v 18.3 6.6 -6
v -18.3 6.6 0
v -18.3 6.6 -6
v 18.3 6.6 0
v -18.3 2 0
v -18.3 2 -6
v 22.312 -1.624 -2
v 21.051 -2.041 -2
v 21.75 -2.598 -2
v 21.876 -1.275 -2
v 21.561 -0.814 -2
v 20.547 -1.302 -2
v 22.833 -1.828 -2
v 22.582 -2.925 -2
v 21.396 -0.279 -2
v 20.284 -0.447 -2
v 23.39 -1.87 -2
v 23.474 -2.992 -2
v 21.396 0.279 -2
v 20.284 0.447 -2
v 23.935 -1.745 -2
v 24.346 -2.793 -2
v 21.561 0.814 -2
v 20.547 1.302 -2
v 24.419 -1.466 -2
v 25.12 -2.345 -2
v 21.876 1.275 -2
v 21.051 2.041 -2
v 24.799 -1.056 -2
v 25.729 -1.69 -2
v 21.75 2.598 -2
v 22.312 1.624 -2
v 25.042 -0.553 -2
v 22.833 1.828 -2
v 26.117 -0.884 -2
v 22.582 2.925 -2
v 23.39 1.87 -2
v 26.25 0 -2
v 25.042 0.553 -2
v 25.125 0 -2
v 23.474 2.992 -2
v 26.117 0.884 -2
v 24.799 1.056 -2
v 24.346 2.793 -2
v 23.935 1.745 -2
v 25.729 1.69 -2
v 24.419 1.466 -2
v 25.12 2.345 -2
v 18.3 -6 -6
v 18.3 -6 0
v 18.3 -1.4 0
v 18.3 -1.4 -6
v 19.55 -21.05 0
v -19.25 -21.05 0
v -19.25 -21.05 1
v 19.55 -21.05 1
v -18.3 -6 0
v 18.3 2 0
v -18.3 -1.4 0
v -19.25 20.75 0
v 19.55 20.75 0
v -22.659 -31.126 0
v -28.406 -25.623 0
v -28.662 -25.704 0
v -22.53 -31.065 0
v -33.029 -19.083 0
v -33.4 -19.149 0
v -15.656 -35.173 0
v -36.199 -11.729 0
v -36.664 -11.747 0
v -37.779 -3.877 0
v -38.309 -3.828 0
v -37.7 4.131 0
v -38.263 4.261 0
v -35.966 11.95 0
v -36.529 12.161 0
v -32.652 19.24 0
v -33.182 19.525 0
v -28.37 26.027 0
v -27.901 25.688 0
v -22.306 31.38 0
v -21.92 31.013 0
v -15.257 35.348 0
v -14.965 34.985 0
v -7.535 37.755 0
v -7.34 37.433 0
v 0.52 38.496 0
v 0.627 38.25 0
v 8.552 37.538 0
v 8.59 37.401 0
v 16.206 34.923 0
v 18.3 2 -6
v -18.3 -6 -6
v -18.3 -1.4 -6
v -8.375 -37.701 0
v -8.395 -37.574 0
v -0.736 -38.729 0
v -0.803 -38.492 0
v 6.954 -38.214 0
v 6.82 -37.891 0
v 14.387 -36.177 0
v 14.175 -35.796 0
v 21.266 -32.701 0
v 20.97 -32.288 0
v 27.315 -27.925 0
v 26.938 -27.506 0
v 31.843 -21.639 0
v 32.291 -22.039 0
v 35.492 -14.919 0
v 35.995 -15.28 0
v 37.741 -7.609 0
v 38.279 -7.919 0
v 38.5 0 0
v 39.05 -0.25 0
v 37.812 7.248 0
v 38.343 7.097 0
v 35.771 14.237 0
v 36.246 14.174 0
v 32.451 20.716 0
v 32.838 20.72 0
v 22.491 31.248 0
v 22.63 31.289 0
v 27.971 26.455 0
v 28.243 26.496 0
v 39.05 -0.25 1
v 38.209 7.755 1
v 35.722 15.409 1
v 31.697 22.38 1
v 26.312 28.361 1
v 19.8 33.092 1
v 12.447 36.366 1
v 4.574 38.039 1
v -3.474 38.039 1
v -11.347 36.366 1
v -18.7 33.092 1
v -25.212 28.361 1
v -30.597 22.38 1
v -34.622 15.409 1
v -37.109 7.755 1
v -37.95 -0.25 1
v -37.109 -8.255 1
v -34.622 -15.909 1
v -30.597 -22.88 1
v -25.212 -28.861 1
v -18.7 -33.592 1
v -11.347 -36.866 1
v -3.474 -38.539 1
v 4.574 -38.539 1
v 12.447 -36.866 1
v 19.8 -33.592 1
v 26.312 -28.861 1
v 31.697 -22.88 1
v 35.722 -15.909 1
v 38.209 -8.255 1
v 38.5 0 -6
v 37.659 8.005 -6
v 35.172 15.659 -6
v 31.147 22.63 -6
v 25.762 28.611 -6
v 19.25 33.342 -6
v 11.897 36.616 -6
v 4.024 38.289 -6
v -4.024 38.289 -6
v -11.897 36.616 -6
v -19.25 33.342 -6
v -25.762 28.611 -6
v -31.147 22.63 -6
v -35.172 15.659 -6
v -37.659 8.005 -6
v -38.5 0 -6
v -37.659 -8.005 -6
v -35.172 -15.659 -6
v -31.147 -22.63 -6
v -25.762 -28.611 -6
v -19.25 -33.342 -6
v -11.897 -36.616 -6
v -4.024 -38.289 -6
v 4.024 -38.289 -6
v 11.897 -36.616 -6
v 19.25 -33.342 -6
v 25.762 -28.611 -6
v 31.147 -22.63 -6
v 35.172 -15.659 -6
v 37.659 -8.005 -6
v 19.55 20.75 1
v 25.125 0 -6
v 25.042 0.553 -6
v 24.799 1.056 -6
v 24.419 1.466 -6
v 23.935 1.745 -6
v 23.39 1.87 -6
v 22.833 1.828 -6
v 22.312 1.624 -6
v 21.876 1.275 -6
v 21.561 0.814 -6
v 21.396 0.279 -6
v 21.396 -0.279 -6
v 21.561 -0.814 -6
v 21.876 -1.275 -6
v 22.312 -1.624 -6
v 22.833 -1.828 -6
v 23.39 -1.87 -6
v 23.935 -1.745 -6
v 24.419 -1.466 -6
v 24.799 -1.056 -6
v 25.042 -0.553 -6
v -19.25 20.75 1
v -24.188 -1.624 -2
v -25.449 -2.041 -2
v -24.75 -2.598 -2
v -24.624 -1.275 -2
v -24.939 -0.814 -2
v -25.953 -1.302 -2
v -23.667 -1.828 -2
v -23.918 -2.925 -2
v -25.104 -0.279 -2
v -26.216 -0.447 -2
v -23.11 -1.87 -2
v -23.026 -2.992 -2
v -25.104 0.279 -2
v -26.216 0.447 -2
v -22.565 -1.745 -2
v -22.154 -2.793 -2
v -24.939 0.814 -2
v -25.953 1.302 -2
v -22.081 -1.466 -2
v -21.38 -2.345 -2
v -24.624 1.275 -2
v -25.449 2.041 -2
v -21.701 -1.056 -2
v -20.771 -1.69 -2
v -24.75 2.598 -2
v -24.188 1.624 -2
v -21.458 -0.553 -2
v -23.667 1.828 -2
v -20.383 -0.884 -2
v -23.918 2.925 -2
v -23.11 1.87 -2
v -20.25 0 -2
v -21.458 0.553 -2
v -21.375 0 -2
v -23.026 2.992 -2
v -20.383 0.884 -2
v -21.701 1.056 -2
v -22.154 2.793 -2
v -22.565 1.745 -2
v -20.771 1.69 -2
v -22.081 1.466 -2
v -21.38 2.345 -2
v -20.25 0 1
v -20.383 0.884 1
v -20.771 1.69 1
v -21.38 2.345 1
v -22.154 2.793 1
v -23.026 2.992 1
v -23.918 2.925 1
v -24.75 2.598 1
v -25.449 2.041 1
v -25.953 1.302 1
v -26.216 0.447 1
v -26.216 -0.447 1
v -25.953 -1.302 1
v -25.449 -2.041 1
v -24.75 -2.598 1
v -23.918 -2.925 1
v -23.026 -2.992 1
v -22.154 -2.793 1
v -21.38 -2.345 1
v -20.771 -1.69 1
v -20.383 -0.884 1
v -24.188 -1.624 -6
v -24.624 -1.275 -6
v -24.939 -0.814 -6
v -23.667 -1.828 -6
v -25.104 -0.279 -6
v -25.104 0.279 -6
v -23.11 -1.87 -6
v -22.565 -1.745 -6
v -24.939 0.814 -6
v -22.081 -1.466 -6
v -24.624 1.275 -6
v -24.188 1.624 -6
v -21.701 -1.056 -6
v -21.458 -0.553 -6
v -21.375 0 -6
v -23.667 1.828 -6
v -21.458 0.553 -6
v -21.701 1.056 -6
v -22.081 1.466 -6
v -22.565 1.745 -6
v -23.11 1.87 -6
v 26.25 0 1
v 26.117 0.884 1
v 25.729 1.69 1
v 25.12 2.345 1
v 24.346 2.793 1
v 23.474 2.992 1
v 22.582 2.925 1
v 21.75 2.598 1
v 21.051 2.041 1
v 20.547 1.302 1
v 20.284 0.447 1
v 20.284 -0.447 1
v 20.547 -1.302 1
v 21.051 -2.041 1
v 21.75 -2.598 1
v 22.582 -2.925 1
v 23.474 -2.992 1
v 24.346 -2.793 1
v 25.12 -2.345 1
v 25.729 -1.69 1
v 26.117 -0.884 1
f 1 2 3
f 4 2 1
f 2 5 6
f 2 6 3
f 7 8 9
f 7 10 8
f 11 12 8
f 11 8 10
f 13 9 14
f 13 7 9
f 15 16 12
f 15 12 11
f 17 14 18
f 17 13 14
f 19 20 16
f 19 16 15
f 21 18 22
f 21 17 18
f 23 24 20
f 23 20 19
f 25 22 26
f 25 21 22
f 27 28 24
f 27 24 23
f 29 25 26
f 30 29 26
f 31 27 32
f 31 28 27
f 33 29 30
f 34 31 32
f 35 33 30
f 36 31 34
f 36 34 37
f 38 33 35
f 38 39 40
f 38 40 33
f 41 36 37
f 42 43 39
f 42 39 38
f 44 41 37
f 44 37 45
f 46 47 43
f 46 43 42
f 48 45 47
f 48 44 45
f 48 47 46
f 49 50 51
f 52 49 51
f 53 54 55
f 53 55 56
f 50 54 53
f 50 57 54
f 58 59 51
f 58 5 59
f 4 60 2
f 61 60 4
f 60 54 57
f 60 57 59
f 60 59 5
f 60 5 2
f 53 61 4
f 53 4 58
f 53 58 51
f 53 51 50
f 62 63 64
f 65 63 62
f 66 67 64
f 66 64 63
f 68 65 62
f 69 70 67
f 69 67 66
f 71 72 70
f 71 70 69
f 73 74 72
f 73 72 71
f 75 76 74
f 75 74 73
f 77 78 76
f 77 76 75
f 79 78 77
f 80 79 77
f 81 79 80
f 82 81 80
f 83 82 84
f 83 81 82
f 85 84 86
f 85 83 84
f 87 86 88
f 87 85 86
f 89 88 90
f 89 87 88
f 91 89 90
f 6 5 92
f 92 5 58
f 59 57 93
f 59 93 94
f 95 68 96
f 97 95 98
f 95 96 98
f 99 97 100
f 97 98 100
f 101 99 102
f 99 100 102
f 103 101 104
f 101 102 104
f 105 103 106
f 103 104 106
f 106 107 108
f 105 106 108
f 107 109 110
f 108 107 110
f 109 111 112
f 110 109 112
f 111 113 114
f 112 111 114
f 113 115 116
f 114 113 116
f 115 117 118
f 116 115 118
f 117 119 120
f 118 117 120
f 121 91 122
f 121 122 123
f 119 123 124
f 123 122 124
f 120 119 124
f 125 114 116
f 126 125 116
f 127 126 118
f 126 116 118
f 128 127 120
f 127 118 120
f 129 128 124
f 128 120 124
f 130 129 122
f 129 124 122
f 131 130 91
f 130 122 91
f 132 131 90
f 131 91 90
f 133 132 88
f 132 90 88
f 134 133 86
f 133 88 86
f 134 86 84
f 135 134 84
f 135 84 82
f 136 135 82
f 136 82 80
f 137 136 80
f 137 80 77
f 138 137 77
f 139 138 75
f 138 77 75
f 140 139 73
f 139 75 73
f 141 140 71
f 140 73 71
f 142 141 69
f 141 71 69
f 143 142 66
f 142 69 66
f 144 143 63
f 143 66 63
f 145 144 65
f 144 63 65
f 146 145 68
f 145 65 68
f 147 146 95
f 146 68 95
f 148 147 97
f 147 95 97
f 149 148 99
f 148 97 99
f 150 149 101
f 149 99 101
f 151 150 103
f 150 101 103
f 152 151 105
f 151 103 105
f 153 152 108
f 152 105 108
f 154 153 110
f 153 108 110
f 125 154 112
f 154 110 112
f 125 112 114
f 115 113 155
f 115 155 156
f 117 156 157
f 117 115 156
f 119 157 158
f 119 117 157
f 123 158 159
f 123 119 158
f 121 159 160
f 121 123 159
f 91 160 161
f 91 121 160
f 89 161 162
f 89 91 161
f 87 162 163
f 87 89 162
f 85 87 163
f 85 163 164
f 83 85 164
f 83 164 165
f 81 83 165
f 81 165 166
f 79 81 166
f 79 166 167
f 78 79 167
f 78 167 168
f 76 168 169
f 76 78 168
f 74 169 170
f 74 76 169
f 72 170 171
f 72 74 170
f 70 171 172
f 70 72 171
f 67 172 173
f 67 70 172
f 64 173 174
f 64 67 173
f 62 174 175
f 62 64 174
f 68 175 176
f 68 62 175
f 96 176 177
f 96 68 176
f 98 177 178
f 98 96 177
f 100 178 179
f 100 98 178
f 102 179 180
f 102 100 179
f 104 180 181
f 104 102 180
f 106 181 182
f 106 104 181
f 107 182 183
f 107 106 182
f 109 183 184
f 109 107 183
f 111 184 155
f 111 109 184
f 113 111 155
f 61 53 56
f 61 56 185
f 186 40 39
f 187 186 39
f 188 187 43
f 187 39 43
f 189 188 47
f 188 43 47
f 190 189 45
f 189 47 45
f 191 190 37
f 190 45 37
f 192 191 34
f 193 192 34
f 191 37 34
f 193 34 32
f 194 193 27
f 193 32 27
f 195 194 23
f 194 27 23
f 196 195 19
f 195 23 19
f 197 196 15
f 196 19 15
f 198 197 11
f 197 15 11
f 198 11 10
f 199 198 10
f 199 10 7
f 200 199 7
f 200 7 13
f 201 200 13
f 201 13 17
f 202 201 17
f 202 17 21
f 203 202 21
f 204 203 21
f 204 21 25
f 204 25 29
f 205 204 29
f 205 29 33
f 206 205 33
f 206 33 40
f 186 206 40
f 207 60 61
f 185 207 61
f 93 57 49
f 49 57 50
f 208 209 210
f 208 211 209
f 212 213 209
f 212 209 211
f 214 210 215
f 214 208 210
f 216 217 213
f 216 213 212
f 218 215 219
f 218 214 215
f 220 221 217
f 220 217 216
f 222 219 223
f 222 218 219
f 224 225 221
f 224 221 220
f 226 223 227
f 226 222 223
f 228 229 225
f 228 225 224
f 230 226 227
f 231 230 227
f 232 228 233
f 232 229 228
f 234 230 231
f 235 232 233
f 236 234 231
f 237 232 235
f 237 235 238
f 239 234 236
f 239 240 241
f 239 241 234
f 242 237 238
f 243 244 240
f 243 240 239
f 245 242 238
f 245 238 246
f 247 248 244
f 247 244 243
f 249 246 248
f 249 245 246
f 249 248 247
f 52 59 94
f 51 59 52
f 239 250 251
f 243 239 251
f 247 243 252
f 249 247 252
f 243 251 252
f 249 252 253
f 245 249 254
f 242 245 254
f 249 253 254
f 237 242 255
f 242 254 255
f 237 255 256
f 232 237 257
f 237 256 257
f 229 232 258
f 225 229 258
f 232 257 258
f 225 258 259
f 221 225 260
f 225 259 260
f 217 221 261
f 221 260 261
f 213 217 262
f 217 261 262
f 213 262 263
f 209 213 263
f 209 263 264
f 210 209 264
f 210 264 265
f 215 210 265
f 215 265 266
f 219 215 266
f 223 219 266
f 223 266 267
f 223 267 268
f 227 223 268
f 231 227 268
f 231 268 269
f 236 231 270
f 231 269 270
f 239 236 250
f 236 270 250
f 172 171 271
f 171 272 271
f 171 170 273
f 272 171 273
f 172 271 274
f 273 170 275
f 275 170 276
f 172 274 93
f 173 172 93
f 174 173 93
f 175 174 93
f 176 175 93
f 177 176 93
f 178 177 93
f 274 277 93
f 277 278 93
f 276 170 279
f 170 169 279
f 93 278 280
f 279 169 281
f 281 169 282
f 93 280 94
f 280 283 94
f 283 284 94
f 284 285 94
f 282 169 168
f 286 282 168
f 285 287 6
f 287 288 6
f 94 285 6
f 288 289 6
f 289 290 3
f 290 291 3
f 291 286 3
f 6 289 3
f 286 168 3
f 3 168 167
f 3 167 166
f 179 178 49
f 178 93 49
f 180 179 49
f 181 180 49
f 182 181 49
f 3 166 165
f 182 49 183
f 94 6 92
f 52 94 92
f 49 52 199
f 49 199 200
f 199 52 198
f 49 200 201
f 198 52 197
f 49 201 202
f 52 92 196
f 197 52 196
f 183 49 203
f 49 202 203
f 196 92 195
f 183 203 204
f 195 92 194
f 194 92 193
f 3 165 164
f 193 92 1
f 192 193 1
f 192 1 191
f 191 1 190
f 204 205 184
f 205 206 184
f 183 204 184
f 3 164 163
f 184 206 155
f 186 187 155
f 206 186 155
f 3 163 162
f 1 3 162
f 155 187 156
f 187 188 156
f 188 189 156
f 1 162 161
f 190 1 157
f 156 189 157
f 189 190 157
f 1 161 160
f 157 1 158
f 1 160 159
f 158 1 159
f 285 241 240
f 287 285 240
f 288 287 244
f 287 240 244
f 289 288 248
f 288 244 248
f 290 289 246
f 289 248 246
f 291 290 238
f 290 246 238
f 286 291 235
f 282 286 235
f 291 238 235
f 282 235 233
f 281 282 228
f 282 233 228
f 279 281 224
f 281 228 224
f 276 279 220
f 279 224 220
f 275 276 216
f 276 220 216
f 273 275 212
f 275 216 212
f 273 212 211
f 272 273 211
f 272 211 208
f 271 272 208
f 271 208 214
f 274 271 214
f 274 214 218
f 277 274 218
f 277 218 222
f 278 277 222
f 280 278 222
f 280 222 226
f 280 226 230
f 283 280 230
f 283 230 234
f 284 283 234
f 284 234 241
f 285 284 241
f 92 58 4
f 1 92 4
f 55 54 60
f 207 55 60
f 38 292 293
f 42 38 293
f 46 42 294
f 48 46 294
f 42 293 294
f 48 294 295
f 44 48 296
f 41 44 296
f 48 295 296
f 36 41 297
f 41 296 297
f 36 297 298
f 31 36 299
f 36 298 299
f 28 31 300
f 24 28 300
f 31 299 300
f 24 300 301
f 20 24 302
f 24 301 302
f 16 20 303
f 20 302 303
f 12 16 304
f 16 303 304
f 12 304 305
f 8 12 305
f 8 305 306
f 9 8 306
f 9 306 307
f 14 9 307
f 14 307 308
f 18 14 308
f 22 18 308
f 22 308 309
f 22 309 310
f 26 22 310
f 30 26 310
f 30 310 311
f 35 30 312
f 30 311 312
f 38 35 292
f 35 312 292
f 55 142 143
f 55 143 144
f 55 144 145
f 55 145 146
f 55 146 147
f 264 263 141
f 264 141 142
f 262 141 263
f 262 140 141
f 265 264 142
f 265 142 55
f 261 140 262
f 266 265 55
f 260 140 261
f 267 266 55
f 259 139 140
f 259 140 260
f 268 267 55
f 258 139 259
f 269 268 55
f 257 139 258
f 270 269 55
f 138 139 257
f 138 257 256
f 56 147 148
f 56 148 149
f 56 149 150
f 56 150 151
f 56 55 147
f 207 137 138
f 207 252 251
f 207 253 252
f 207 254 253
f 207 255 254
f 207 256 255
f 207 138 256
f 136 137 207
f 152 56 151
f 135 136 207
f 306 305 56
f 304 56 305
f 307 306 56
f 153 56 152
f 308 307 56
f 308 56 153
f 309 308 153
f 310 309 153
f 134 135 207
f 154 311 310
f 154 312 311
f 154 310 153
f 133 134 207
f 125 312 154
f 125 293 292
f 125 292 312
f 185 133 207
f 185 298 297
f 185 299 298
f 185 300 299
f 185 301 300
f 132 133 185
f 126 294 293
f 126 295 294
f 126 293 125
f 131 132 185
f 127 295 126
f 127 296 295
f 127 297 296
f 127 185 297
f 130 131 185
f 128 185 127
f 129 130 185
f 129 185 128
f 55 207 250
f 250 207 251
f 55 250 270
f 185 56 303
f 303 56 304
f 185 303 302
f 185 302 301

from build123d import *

# Parameters (mm, degrees)
SKETCH1_R                  = 38.5
SKETCH1_R_2                = 1.875
SKETCH1_W                  = 36.6
SKETCH1_H                  = 4.6
MAIN_FLANGE_COUPLING_DEPTH = 6
SKETCH2_R                  = 38.5
SKETCH2_R_2                = 1.65
SKETCH2_W                  = 38.8
SKETCH2_H                  = 41.8
BOSS_EXTRUDE1_DEPTH        = 1
SKETCH3_R                  = 3
CUT_EXTRUDE1_DEPTH         = 3


with BuildPart() as part:
    # Sketch1 → Main Flange Coupling (new body)
    with BuildSketch(Plane.XY):
        Circle(SKETCH1_R)
        with Locations((-23.25, 0)):
            Circle(SKETCH1_R_2, mode=Mode.SUBTRACT)
        with Locations((23.25, 0)):
            Circle(SKETCH1_R_2, mode=Mode.SUBTRACT)
        with Locations((0, 4.3)):
            Rectangle(SKETCH1_W, SKETCH1_H, mode=Mode.SUBTRACT)
        with Locations((0, -3.7)):
            Rectangle(SKETCH1_W, SKETCH1_H, mode=Mode.SUBTRACT)
    extrude(amount=-MAIN_FLANGE_COUPLING_DEPTH)

    # Sketch2 → Boss-Extrude1 (add)
    with BuildSketch(Plane.XY):
        with Locations((0.55, -0.25)):
            Circle(SKETCH2_R)
        with Locations((-23.25, 0)):
            Circle(SKETCH2_R_2, mode=Mode.SUBTRACT)
        with Locations((23.25, 0)):
            Circle(SKETCH2_R_2, mode=Mode.SUBTRACT)
        with Locations((0.15, -0.15)):
            Rectangle(SKETCH2_W, SKETCH2_H, mode=Mode.SUBTRACT)
    extrude(amount=BOSS_EXTRUDE1_DEPTH)

    # Sketch3 → Cut-Extrude1 (cut)
    with BuildSketch(Plane.XY.offset(1)):
        with Locations((-23.25, 0)):
            Circle(SKETCH3_R)
        with Locations((23.25, 0)):
            Circle(SKETCH3_R)
    extrude(amount=-CUT_EXTRUDE1_DEPTH, mode=Mode.SUBTRACT)


solid = part.part
